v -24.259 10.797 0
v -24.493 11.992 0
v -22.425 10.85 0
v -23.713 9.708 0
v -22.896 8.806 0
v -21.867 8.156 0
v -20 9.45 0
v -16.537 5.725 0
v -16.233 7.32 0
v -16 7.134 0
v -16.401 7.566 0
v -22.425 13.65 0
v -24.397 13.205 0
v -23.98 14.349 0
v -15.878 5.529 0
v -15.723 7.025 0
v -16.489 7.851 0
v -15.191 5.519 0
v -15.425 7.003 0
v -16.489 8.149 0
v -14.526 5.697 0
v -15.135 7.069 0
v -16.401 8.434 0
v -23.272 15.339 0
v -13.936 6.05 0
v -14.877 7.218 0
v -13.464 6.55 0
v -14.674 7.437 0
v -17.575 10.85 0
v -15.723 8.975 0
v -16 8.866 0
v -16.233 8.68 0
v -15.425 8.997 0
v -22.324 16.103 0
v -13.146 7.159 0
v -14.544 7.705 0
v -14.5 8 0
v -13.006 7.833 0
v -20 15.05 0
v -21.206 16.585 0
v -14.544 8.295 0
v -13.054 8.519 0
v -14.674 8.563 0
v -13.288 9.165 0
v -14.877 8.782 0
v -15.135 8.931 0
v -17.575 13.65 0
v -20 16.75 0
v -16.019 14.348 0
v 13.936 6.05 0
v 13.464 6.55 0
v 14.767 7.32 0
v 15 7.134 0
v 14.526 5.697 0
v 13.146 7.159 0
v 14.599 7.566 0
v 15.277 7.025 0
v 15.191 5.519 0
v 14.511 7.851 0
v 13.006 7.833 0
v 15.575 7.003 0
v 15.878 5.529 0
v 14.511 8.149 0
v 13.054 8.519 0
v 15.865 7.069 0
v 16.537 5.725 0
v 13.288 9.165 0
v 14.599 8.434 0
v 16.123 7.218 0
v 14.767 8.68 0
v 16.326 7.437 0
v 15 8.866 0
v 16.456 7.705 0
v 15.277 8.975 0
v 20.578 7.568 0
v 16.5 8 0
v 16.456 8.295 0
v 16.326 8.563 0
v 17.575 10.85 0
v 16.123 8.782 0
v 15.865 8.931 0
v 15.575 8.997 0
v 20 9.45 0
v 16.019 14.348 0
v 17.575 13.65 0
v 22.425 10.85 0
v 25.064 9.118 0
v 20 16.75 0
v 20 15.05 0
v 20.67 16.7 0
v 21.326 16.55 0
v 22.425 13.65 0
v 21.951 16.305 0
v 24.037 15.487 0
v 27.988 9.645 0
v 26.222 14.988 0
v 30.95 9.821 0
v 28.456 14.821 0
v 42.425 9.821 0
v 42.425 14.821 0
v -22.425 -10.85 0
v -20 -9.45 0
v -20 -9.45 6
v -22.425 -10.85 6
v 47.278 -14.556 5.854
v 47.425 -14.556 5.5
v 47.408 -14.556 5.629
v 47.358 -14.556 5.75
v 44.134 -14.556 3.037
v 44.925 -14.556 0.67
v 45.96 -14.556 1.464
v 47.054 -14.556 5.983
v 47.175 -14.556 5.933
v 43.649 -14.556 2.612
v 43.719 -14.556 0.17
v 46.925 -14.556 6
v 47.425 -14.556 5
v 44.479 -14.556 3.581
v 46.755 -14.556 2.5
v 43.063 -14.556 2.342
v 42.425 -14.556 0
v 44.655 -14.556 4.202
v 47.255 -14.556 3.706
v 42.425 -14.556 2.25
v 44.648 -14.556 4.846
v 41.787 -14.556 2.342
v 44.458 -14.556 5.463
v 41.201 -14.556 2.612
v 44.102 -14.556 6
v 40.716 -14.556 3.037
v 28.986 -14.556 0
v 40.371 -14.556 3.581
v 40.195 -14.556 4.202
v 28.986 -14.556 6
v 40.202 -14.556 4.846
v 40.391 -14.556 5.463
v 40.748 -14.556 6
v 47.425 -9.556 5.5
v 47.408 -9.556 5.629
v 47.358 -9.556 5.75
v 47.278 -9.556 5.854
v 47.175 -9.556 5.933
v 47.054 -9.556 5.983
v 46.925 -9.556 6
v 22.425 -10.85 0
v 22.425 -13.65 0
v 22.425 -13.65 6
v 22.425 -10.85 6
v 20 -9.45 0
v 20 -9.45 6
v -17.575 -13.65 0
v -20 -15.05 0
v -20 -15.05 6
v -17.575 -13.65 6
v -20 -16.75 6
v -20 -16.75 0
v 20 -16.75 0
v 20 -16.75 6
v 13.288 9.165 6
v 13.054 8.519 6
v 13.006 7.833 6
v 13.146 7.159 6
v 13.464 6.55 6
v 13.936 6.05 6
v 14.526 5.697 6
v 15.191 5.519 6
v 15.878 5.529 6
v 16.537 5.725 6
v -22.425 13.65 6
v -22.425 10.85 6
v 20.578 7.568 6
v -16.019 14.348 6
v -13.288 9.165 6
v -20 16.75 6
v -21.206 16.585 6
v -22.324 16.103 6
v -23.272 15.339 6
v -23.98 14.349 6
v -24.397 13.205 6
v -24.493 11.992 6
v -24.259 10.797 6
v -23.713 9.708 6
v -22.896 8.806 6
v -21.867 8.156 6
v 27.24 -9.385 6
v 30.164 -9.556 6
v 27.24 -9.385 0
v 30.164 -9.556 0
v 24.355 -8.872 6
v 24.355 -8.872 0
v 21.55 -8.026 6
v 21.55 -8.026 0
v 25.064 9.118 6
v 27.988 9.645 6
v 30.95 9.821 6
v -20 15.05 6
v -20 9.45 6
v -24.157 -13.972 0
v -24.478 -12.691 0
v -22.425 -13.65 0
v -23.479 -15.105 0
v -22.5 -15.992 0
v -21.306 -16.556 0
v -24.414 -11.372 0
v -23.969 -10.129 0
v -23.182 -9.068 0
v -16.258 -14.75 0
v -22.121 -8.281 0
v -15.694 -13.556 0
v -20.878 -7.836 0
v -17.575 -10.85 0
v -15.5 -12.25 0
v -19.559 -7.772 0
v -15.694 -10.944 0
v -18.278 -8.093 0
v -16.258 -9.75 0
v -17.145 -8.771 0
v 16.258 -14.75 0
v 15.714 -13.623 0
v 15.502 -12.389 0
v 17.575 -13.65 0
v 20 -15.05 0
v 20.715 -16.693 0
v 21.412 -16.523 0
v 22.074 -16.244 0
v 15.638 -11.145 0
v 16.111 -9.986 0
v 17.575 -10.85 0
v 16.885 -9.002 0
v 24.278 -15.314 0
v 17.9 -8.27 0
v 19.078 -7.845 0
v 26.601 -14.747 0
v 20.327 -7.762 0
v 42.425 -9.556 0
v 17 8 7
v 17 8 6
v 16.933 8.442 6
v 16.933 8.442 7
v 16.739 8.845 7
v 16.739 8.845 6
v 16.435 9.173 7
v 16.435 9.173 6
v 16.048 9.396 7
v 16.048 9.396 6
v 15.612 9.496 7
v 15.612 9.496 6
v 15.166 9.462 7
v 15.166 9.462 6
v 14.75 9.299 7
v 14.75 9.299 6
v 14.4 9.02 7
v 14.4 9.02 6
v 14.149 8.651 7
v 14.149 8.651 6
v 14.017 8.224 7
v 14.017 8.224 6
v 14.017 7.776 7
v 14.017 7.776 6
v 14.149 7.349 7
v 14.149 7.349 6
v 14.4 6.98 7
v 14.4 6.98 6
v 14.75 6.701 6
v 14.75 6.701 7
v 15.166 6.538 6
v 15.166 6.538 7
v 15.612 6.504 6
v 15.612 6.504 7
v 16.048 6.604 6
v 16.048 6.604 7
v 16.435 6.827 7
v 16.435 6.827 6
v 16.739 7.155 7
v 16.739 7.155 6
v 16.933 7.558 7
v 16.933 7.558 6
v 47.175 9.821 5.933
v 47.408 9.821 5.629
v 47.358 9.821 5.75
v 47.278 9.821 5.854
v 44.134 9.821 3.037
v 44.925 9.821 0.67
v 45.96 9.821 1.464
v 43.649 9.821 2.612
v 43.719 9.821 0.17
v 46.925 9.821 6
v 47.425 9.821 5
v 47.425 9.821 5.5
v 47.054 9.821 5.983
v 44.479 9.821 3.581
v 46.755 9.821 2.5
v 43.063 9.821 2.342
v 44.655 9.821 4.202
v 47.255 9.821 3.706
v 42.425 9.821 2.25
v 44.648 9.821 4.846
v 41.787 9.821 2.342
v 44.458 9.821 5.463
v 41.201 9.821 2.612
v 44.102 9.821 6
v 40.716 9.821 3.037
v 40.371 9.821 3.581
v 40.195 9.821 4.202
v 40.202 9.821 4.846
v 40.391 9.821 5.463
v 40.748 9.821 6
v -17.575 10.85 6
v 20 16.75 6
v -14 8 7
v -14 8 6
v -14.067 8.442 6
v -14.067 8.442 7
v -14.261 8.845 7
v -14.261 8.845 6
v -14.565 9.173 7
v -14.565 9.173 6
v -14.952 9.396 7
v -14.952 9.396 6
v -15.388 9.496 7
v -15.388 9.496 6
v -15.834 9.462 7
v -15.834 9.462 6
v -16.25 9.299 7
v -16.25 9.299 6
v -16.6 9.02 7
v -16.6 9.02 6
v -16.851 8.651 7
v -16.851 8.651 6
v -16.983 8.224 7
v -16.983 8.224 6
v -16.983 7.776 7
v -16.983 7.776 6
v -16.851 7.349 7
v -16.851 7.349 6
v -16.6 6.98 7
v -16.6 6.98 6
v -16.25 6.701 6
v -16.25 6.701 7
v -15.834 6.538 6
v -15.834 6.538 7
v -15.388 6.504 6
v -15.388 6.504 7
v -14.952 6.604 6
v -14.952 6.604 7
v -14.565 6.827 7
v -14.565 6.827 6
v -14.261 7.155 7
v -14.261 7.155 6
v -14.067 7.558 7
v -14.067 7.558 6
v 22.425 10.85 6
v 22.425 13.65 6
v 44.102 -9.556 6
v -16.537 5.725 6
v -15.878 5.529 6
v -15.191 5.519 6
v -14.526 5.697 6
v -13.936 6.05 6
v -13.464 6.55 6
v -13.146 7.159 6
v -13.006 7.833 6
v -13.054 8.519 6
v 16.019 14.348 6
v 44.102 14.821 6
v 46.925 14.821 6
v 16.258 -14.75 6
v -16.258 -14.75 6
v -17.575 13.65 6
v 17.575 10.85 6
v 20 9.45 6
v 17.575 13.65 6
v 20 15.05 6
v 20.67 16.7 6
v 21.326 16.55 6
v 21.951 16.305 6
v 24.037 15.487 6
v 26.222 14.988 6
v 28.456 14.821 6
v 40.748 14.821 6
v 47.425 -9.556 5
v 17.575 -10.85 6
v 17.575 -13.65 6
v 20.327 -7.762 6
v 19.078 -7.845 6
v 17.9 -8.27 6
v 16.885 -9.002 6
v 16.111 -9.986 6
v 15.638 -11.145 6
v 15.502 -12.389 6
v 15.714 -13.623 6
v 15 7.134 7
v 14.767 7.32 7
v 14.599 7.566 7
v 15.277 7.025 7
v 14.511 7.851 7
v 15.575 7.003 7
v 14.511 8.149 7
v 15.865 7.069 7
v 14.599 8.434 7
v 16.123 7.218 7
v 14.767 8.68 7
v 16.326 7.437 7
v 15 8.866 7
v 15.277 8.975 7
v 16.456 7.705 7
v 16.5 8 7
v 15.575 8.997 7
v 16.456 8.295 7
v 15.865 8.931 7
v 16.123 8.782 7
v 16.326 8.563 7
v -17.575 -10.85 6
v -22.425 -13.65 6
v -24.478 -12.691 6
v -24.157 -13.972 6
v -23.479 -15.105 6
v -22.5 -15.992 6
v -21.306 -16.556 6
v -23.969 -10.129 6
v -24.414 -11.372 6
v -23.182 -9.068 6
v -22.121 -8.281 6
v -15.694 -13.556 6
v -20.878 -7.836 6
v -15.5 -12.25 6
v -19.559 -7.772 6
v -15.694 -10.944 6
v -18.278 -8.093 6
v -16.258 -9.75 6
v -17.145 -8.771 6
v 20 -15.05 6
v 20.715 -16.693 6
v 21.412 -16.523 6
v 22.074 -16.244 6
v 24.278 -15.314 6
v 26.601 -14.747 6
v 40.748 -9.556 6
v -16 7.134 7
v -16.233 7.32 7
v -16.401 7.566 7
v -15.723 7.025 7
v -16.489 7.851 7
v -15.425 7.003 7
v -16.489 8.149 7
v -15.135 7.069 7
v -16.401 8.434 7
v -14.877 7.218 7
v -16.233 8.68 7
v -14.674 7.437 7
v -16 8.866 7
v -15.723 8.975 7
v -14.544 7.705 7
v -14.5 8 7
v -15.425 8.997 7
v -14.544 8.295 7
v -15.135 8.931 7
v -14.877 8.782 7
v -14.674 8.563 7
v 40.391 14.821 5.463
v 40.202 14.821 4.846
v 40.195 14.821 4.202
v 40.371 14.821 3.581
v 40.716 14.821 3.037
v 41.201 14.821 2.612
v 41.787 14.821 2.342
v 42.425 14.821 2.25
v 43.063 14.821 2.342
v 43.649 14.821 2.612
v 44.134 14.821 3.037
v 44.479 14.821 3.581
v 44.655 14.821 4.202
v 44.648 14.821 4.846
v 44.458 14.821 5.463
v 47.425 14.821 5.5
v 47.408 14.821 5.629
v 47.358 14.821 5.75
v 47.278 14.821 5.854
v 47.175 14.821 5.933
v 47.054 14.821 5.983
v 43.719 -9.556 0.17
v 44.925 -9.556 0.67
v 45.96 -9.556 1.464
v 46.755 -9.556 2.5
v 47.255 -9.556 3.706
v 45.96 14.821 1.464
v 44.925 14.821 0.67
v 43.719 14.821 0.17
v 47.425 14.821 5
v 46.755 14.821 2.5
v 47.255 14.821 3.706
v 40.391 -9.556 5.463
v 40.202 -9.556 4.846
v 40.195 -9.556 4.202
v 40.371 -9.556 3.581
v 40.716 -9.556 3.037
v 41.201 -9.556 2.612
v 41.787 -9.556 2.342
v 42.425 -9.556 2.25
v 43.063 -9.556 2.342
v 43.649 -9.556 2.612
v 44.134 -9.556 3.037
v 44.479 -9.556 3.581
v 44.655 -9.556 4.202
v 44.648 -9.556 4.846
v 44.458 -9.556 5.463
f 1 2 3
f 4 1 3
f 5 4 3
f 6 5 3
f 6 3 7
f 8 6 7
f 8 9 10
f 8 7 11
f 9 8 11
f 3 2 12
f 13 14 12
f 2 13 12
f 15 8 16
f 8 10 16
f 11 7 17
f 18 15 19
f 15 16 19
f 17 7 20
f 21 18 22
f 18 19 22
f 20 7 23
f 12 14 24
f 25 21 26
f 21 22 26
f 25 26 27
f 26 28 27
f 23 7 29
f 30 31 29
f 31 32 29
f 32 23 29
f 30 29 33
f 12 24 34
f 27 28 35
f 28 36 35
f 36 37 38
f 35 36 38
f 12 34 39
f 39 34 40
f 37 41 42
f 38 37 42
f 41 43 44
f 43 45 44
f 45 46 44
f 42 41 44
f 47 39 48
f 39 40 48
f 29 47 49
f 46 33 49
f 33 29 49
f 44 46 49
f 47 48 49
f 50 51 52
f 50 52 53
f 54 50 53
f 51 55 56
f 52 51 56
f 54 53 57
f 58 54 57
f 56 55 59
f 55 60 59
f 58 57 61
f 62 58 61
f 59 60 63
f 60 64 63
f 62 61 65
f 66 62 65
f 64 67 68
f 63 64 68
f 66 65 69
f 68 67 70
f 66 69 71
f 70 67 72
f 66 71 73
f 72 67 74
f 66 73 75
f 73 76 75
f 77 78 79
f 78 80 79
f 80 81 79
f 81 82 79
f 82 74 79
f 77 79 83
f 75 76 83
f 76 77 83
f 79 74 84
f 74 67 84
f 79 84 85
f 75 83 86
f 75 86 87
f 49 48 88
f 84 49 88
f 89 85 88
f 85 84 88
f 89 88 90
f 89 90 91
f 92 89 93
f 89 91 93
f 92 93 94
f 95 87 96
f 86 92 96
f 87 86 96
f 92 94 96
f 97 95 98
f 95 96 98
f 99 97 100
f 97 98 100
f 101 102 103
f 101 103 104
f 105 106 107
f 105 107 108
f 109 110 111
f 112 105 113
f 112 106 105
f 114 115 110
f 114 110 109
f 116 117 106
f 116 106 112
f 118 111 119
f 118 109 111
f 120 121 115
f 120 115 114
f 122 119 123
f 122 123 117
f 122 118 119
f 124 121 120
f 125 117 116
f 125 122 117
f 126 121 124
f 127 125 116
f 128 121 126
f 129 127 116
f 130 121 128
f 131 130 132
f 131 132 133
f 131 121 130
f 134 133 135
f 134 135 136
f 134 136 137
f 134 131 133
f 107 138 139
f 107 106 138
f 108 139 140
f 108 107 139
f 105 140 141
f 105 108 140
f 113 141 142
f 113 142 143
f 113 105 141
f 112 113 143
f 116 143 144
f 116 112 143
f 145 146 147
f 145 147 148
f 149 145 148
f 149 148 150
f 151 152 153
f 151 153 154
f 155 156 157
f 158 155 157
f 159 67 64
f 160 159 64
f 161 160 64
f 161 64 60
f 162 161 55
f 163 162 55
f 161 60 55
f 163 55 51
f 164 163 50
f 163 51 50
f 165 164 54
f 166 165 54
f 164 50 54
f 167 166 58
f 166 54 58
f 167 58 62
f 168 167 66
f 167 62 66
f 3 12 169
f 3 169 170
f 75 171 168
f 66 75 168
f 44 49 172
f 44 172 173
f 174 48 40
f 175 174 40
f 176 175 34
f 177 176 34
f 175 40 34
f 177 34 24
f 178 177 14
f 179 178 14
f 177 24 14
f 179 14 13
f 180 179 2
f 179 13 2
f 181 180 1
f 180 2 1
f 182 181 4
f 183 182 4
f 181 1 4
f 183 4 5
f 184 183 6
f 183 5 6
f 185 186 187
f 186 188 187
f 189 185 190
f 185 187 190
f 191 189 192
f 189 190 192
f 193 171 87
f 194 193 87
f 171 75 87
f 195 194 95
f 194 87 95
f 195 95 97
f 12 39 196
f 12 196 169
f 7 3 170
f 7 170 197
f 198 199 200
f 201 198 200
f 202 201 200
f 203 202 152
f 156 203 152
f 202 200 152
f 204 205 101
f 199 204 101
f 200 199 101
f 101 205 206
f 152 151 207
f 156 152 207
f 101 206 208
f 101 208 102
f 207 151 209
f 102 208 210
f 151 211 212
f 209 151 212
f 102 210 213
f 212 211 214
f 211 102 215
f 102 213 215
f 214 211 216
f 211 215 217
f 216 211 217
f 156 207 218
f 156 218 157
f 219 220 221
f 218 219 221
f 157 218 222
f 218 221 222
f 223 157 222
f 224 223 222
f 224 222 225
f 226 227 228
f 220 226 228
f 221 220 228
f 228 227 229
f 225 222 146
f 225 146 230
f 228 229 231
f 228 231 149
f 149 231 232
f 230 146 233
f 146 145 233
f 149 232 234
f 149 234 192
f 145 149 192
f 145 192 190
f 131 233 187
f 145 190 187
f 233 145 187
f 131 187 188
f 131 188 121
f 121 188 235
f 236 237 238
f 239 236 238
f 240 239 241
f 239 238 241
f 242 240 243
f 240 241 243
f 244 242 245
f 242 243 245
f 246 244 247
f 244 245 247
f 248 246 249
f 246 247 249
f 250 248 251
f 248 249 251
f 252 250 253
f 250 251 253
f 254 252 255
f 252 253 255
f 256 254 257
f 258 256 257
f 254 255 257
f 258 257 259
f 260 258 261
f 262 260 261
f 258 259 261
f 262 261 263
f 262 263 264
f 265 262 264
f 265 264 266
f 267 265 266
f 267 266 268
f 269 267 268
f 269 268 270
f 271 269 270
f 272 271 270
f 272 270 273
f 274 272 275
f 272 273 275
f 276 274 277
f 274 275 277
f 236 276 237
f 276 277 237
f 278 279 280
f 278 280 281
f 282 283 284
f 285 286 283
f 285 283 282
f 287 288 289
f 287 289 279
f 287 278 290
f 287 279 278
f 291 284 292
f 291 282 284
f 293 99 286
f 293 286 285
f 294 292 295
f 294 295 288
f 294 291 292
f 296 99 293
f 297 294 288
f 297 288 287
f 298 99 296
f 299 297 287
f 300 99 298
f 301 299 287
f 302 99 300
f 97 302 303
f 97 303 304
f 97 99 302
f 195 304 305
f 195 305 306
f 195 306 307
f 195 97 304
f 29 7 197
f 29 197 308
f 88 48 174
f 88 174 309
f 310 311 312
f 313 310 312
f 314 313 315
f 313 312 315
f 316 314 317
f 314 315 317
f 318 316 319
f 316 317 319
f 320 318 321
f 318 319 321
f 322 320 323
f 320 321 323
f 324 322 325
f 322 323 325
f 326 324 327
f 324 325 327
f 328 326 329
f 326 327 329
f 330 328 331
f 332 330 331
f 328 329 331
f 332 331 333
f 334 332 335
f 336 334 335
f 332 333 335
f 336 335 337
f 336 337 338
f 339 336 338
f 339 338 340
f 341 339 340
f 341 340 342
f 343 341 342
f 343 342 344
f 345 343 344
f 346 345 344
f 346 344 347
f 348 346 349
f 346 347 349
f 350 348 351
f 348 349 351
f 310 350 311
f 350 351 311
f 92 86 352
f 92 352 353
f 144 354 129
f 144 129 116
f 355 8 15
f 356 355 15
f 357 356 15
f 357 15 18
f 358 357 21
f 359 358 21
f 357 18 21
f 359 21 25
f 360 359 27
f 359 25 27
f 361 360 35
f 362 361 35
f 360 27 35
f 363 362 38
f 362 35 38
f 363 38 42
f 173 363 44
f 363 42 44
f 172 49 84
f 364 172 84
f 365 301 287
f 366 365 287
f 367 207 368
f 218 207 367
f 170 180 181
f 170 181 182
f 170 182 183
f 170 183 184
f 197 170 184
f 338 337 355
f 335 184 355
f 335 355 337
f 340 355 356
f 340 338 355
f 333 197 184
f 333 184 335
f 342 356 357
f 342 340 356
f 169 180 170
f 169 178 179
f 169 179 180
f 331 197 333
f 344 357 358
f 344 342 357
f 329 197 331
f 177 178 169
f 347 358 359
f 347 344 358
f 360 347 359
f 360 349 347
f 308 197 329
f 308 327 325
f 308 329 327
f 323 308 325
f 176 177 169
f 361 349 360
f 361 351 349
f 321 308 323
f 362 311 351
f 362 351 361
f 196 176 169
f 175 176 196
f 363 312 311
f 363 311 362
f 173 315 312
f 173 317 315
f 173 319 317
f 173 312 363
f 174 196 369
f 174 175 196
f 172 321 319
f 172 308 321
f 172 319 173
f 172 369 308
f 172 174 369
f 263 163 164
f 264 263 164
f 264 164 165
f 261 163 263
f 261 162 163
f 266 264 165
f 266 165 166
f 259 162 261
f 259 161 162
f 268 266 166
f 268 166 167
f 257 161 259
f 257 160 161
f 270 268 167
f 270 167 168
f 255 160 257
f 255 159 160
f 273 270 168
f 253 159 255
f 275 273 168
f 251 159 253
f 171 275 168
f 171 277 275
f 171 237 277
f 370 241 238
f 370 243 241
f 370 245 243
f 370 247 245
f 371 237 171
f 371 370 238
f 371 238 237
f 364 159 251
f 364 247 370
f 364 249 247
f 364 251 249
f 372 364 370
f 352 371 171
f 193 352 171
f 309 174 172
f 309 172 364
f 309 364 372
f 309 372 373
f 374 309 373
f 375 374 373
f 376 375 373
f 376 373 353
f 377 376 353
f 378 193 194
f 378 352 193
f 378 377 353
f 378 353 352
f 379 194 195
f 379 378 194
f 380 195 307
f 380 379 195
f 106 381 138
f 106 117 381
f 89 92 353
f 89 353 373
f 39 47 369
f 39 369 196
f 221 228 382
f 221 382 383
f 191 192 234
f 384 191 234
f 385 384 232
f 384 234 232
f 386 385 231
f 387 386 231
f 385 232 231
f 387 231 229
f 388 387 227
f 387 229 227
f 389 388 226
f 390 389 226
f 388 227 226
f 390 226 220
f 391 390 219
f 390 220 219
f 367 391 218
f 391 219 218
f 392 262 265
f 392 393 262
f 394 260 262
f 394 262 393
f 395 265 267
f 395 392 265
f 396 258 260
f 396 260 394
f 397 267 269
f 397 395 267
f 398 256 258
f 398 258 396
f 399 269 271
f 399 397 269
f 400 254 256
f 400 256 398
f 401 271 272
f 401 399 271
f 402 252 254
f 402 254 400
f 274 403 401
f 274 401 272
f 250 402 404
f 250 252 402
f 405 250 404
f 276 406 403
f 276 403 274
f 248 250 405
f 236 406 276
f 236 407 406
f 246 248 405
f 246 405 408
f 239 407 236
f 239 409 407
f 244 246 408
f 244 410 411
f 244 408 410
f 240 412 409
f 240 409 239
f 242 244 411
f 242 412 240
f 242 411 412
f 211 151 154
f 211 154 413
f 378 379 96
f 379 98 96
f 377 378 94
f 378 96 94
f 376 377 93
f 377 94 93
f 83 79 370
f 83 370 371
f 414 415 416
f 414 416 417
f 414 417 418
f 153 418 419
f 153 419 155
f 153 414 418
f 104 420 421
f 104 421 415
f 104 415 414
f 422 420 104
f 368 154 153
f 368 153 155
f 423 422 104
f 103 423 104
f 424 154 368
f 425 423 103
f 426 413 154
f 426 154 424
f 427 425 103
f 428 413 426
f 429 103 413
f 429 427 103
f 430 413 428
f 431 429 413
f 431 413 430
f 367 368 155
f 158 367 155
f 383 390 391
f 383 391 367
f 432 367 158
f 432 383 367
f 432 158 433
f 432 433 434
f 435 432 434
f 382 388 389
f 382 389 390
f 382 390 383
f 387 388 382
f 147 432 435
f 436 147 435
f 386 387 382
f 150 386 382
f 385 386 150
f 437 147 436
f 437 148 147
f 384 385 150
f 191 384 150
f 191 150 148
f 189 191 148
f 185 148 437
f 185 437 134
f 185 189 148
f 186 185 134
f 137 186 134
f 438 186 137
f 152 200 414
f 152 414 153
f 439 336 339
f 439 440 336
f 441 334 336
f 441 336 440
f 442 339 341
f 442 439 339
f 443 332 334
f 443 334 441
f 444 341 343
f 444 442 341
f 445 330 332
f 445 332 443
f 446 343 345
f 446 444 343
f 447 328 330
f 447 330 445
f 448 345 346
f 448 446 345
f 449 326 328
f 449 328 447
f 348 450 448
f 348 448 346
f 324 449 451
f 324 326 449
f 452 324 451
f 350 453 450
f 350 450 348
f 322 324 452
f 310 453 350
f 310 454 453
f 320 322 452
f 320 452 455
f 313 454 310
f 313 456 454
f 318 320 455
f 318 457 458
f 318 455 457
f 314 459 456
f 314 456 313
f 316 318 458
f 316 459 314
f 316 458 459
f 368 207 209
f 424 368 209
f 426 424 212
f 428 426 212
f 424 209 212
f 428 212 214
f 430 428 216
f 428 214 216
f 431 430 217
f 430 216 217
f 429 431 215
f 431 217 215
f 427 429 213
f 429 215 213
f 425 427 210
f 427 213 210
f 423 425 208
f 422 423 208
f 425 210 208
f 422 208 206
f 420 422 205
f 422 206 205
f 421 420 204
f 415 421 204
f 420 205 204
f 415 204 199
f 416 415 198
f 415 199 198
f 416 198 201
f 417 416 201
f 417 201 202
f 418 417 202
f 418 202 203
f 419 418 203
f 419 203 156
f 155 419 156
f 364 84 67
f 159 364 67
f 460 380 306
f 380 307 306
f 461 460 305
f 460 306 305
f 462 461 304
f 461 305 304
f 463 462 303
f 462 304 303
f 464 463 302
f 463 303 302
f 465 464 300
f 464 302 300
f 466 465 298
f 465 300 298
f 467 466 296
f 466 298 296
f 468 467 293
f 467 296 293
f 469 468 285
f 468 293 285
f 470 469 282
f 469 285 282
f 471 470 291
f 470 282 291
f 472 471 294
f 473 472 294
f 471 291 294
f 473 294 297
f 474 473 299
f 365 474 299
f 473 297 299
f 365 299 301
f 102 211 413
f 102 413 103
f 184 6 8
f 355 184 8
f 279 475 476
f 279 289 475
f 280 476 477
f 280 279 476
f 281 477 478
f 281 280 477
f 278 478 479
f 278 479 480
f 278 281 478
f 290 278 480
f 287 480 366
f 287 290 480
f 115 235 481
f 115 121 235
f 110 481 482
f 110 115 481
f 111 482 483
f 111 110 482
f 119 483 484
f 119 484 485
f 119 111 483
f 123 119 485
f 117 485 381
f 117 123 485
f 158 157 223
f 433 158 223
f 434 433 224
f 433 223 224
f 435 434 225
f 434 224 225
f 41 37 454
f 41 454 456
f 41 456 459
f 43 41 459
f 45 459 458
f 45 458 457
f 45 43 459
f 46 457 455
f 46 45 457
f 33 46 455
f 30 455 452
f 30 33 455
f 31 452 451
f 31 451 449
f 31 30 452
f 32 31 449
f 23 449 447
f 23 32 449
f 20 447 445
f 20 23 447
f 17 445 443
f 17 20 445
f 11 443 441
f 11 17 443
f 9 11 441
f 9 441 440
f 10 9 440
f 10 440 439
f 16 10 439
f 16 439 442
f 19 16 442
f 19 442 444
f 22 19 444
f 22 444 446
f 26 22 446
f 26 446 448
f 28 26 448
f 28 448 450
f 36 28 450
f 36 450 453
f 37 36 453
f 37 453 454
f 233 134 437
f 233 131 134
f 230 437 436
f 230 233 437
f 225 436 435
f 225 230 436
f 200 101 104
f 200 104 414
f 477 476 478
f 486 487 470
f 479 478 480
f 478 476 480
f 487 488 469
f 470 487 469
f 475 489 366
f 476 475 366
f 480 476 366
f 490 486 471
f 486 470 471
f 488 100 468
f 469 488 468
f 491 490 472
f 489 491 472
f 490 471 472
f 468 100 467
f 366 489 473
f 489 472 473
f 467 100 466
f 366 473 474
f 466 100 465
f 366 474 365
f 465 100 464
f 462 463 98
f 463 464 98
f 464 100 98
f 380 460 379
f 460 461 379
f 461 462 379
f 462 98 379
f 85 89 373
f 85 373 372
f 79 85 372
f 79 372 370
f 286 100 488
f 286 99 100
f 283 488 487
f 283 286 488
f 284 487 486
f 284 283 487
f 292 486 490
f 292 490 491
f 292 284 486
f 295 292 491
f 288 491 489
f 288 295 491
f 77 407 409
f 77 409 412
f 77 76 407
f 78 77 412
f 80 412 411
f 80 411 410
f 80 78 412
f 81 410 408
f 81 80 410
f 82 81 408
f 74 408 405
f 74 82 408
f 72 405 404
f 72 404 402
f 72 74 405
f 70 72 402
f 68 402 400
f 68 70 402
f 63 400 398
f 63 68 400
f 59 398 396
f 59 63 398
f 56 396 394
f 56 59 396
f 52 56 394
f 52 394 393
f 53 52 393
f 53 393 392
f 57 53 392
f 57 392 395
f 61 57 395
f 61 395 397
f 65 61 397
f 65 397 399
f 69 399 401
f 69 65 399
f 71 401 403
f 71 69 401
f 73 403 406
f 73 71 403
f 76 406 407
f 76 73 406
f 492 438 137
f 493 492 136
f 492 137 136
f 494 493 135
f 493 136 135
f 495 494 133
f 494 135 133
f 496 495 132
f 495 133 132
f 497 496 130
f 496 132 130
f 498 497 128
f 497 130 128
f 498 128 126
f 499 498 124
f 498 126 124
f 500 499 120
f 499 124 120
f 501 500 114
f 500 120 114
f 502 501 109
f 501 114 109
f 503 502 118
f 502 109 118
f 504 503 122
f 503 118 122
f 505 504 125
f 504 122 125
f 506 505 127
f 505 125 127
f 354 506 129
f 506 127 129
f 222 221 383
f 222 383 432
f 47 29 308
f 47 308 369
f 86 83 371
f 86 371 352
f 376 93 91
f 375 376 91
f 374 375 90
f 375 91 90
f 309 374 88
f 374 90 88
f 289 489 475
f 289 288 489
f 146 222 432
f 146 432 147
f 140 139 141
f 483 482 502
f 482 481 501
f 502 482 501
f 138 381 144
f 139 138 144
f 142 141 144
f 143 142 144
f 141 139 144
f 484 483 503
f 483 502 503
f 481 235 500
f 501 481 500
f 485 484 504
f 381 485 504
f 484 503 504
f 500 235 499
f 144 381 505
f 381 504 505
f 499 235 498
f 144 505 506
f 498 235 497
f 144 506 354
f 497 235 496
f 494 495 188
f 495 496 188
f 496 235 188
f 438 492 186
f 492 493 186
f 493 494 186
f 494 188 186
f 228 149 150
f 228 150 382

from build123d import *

# Parameters (mm, degrees)
SKETCH005_R     = 1
PAD002_DEPTH    = 6
SKETCH006_W     = 6
SKETCH006_H     = 5
PAD003_DEPTH    = 25
SKETCH007_R     = 2.25
POCKET001_DEPTH = 29.377419
FILLET001_R     = 5
FILLET002_R     = 0.5
SKETCH008_R     = 1.5
SKETCH008_R_2   = 1
PAD004_DEPTH    = 1
FILLET003_R     = 25
FILLET004_R     = 15


with BuildPart() as part:
    # Sketch005 → Pad002 (new body)
    with BuildSketch(Plane.XY):
        with BuildLine():
            ThreePointArc((-20, 16.75), (-24.397441, 13.205256), (-21.866969, 8.155562))
            Line((-21.866969, 8.155562), (-16.537205, 5.725312))
            ThreePointArc((-16.537205, 5.725312), (-13.682467, 6.283441), (-13.288243, 9.165389))
            Line((-16.018838, 14.347701), (-13.288243, 9.165389))
            Line((-16.018838, 14.347701), (16.018838, 14.347701))
            Line((16.018838, 14.347701), (13.288243, 9.165389))
            ThreePointArc((13.288243, 9.165389), (13.682467, 6.283441), (16.537205, 5.725312))
            Line((21.866969, 8.155562), (16.537205, 5.725312))
            ThreePointArc((21.866969, 8.155562), (24.397438, 13.205268), (19.999975, 16.75))
            Line((-20, 16.75), (19.999975, 16.75))
        make_face()
        with Locations((-15.5, 8)):
            Circle(SKETCH005_R, mode=Mode.SUBTRACT)
        with Locations((15.5, 8)):
            Circle(SKETCH005_R, mode=Mode.SUBTRACT)
        Polygon((-17.575129, 13.65), (-20, 15.05), (-22.424871, 13.65), (-22.424871, 10.85), (-20, 9.45), (-17.575129, 10.85), align=None, mode=Mode.SUBTRACT)
        Polygon((22.424871, 13.65), (20, 15.05), (17.575129, 13.65), (17.575129, 10.85), (20, 9.45), (22.424871, 10.85), align=None, mode=Mode.SUBTRACT)
        with BuildLine():
            ThreePointArc((-16.258343, -14.75), (-22.12132, -8.281373), (-20, -16.75))
            Line((-20, -16.75), (20.00002, -16.75))
            ThreePointArc((20.00002, -16.75), (22.121311, -8.281368), (16.258343, -14.75))
            Line((-16.258343, -14.75), (16.258343, -14.75))
        make_face()
        Polygon((-17.575129, -10.85), (-20, -9.45), (-22.424871, -10.85), (-22.424871, -13.65), (-20, -15.05), (-17.575129, -13.65), align=None, mode=Mode.SUBTRACT)
        Polygon((22.424871, -10.85), (20, -9.45), (17.575129, -10.85), (17.575129, -13.65), (20, -15.05), (22.424871, -13.65), align=None, mode=Mode.SUBTRACT)
    extrude(amount=PAD002_DEPTH)

    # Sketch006 (on Vertex58 of Pad002) → Pad003 (join)
    with BuildSketch(Plane(origin=(22.424871, 0, 3), x_dir=(0, 0, 1), z_dir=(1, 0, 0))):
        with Locations((0, -12.321085)):
            Rectangle(SKETCH006_W, SKETCH006_H)
        with Locations((0, 12.056333)):
            Rectangle(SKETCH006_W, SKETCH006_H)
    extrude(amount=PAD003_DEPTH)

    # Sketch007 (on Face37 of Pad003) → Pocket001 (cut)
    with BuildSketch(Plane.XZ.offset(14.556333)):
        with Locations((42.424871, 4.5)):
            Circle(SKETCH007_R)
    extrude(amount=-POCKET001_DEPTH, mode=Mode.SUBTRACT)

    # Fillet001
    fillet001_edges = [part.edges().sort_by_distance(p)[0] for p in [
        (47.424871, -12.056333, 0),
        (47.424871, 12.321085, 0),
    ]]
    fillet(fillet001_edges, radius=FILLET001_R)

    # Fillet002
    fillet002_edges = [part.edges().sort_by_distance(p)[0] for p in [
        (47.424871, -12.056333, 6),
        (47.424871, 12.321085, 6),
    ]]
    fillet(fillet002_edges, radius=FILLET002_R)

    # Sketch008 → Pad004 (join)
    with BuildSketch(Plane.XY.offset(6)):
        with Locations((15.5, 8)):
            Circle(SKETCH008_R)
        with Locations((15.5, 8)):
            Circle(SKETCH008_R_2, mode=Mode.SUBTRACT)
        with Locations((-15.5, 8)):
            Circle(SKETCH008_R)
        with Locations((-15.5, 8)):
            Circle(SKETCH008_R_2, mode=Mode.SUBTRACT)
    extrude(amount=PAD004_DEPTH)

    # Fillet003
    fillet003_edges = [part.edges().sort_by_distance(p)[0] for p in [
        (23.604741, -9.556333, 3),
        (23.788189, 9.821085, 3),
    ]]
    fillet(fillet003_edges, radius=FILLET003_R)

    # Fillet004
    fillet004_edges = [part.edges().sort_by_distance(p)[0] for p in [
        (23.864043, -14.556333, 3),
        (23.693172, 14.821085, 3),
    ]]
    fillet(fillet004_edges, radius=FILLET004_R)


solid = part.part
